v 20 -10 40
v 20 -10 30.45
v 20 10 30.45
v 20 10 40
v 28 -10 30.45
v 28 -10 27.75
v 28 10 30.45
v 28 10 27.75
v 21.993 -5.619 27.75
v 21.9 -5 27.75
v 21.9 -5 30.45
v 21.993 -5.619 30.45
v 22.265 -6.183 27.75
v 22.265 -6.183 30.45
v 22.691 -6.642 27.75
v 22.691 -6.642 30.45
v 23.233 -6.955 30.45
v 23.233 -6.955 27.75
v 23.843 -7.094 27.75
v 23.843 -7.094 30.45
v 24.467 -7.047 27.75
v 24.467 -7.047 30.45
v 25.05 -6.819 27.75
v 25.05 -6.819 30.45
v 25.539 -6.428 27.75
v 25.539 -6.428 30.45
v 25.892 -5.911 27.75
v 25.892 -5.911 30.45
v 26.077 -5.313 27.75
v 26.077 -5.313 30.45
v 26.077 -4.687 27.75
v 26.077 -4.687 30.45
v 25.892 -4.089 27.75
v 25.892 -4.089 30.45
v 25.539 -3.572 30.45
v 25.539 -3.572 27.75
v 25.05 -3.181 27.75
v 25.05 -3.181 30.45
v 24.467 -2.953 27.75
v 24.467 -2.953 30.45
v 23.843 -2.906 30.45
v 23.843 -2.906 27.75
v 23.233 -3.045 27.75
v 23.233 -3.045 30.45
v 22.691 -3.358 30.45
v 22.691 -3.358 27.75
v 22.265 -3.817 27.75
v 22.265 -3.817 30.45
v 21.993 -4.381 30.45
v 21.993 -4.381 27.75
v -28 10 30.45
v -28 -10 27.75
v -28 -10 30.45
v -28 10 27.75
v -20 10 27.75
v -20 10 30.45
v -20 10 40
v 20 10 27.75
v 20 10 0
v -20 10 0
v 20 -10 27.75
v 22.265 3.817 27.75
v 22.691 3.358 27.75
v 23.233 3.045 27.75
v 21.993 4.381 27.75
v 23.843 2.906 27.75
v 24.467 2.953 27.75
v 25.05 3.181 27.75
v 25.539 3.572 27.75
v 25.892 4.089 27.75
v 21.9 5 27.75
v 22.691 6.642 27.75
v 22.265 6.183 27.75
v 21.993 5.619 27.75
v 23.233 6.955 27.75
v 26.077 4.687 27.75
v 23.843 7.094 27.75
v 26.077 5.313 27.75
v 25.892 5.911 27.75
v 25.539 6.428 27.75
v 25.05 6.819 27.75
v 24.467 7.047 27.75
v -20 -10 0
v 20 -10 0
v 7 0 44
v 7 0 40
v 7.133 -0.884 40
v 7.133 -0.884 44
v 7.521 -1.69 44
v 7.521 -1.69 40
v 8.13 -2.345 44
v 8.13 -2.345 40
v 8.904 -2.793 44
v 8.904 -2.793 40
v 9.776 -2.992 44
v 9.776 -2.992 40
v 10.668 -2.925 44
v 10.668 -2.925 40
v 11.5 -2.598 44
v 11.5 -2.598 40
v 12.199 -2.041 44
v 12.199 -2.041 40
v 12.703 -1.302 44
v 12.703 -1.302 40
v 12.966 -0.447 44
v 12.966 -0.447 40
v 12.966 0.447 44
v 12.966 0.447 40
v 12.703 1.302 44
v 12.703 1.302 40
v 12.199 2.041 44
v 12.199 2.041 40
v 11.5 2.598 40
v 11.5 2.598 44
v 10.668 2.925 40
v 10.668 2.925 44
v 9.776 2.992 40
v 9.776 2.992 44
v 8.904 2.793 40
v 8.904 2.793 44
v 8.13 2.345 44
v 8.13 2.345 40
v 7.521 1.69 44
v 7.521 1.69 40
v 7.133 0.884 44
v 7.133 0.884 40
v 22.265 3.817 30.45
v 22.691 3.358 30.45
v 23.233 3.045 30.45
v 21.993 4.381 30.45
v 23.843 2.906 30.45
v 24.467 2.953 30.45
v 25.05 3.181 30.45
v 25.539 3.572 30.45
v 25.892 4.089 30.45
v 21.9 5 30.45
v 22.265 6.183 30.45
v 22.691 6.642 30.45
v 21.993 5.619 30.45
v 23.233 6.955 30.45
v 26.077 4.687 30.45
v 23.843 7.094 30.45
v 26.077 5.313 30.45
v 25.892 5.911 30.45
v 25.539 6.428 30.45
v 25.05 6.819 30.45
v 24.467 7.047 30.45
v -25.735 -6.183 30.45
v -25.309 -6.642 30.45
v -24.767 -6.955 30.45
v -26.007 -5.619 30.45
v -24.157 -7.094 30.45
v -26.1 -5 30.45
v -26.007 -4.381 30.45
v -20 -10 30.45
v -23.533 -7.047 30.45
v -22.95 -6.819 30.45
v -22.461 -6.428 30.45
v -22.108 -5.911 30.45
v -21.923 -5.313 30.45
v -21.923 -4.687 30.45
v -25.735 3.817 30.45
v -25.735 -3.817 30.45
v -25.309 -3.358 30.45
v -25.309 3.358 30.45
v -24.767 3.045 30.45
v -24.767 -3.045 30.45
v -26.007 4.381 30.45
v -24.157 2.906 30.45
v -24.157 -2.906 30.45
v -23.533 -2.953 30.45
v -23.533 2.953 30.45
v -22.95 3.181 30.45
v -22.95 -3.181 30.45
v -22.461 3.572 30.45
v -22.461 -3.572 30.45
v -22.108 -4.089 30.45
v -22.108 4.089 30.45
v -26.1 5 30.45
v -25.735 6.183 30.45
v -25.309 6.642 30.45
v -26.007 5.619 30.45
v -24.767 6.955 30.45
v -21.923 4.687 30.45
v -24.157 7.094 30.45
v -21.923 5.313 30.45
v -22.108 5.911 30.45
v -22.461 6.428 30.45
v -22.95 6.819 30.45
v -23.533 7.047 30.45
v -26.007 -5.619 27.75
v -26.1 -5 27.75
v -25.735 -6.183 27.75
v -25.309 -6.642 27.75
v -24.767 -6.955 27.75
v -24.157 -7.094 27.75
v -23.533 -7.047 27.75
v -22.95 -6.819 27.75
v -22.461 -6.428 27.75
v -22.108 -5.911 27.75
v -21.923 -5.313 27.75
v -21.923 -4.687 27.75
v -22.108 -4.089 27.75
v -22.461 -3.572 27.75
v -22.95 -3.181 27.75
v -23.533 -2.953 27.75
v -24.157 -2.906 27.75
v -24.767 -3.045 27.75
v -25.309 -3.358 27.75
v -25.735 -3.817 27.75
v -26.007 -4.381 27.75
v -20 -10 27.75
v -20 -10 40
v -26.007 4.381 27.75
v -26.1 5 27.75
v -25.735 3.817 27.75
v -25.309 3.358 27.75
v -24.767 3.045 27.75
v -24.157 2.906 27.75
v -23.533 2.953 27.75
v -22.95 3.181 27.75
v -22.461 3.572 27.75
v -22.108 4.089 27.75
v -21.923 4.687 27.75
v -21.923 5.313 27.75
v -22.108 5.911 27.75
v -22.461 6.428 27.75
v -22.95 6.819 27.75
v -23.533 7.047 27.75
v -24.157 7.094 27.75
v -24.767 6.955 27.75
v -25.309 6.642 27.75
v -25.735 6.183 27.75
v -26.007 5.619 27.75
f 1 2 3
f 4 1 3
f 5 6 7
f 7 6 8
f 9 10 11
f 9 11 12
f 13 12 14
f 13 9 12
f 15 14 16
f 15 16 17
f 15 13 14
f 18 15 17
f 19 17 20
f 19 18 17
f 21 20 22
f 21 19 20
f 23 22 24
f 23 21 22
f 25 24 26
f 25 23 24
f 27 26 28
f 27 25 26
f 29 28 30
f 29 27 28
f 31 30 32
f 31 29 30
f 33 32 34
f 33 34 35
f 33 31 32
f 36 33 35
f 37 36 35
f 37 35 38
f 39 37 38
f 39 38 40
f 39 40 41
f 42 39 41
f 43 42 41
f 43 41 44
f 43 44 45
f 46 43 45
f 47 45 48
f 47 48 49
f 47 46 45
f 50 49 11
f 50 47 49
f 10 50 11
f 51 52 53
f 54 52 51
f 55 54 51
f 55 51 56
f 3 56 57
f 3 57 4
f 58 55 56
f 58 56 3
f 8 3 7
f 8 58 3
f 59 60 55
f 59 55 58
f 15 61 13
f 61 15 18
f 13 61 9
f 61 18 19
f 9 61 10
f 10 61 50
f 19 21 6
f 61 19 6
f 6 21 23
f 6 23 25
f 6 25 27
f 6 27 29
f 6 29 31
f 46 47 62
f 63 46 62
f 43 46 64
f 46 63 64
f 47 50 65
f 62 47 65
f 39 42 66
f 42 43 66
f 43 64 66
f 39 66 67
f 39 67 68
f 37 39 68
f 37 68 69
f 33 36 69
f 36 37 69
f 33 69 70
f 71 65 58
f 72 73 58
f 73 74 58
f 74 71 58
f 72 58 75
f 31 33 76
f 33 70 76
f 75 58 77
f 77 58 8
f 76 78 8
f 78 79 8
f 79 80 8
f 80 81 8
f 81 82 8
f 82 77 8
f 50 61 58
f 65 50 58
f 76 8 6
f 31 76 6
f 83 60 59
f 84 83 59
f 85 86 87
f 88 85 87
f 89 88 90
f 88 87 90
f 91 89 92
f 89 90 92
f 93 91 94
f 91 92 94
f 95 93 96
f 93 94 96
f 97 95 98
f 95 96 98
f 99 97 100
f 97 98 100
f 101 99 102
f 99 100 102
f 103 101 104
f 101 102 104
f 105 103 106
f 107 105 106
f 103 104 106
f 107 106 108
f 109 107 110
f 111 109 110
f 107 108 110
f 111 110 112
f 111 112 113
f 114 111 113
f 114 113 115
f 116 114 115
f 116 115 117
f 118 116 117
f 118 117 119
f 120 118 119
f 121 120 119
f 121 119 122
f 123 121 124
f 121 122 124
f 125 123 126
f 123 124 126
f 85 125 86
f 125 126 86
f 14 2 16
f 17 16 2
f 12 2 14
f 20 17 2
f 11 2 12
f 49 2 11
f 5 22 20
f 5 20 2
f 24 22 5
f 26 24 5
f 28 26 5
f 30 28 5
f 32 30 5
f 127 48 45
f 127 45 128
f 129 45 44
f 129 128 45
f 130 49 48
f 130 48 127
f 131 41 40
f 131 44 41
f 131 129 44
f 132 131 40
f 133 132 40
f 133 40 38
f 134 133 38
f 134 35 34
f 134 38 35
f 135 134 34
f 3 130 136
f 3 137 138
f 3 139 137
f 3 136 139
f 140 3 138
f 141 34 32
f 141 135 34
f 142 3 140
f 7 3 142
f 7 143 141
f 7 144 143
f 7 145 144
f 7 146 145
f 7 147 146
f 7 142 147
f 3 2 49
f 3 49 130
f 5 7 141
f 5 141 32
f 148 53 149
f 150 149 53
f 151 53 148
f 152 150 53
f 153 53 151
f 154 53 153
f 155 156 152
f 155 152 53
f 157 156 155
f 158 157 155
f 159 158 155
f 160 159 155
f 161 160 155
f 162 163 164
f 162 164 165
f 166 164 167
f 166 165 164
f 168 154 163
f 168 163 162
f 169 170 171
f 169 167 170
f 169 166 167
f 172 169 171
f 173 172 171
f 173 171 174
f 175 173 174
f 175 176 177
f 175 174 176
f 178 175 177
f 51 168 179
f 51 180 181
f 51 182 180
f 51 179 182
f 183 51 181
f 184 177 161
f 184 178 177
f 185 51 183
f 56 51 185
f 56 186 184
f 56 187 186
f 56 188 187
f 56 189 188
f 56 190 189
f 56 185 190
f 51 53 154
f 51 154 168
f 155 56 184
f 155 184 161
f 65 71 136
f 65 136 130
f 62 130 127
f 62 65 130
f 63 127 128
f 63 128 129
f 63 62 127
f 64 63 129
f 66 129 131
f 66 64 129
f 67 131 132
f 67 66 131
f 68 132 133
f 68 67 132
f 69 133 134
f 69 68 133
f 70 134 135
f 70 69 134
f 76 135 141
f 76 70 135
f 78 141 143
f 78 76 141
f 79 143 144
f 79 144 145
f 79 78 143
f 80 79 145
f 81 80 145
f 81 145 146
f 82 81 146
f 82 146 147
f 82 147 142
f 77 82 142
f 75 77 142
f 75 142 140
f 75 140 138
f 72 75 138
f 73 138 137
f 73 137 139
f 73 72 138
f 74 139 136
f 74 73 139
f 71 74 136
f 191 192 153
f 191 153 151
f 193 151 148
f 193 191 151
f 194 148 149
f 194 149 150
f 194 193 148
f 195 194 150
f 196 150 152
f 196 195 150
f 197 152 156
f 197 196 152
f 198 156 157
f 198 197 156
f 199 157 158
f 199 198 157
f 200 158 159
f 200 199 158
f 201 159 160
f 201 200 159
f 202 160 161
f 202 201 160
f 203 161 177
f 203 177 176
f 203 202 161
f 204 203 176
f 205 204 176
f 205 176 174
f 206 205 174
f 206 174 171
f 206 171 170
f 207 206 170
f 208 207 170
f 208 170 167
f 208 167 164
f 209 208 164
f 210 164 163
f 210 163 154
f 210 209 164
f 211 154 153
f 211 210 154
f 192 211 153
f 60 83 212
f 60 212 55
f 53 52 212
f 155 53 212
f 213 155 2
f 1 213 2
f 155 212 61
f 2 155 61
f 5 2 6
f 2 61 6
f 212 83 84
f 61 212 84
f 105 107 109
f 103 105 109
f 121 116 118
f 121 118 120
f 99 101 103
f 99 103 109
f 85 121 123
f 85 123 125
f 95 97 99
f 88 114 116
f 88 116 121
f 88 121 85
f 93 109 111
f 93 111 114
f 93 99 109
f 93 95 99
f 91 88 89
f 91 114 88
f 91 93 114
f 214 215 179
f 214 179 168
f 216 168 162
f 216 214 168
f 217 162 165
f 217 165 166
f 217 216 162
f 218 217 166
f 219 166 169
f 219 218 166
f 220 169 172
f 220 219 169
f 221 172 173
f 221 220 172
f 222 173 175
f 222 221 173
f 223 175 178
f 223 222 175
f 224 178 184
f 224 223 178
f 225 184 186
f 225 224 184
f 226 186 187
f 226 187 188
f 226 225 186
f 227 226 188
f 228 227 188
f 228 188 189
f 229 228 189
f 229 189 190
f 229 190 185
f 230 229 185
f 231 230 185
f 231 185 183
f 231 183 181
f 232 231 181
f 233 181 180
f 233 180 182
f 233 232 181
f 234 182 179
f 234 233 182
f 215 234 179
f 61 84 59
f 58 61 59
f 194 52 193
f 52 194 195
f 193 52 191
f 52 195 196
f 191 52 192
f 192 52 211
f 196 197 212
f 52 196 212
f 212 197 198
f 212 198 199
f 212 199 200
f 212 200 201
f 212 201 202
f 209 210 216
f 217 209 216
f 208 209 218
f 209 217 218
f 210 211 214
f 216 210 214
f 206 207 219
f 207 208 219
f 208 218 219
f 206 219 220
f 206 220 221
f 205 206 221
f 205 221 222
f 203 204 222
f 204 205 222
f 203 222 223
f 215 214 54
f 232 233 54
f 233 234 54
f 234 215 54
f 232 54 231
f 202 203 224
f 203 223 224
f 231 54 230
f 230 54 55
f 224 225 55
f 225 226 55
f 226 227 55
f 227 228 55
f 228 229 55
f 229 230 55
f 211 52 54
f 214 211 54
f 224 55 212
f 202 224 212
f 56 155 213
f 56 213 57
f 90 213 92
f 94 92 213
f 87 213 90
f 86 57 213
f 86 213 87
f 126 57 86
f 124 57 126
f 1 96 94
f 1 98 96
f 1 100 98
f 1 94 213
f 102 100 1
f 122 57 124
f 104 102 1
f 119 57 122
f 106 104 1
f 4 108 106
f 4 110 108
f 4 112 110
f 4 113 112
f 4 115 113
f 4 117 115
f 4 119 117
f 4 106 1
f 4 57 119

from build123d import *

# Parameters (mm, degrees)
SKETCH1_W           = 40
SKETCH1_H           = 20
BOSS_EXTRUDE1_DEPTH = 40
BOSS_EXTRUDE2_START = 40
SKETCH2_R           = 3
BOSS_EXTRUDE2_DEPTH = 4
BOSS_EXTRUDE3_START = 27.75
SKETCH3_W           = 56
SKETCH3_H           = 20
SKETCH3_R           = 2.1
BOSS_EXTRUDE3_DEPTH = 2.7


with BuildPart() as part:
    # Sketch1 → Boss-Extrude1 (new body)
    with BuildSketch(Plane.XY):
        Rectangle(SKETCH1_W, SKETCH1_H)
    extrude(amount=BOSS_EXTRUDE1_DEPTH)

    # Sketch2 → Boss-Extrude2 (add)
    with BuildSketch(Plane.XY.offset(BOSS_EXTRUDE2_START)):
        with Locations(Location((10, 0, 0), (0, 0, 180))):
            Circle(SKETCH2_R)
    extrude(amount=BOSS_EXTRUDE2_DEPTH)

    # Sketch3 → Boss-Extrude3 (add)
    with BuildSketch(Plane.XY.offset(BOSS_EXTRUDE3_START)):
        Rectangle(SKETCH3_W, SKETCH3_H)
        with Locations(Location((-24, 5, 0), (0, 0, 180))):
            Circle(SKETCH3_R, mode=Mode.SUBTRACT)
        with Locations(Location((-24, -5, 0), (0, 0, 180))):
            Circle(SKETCH3_R, mode=Mode.SUBTRACT)
        with Locations(Location((24, -5, 0), (0, 0, 180))):
            Circle(SKETCH3_R, mode=Mode.SUBTRACT)
        with Locations(Location((24, 5, 0), (0, 0, 180))):
            Circle(SKETCH3_R, mode=Mode.SUBTRACT)
    extrude(amount=BOSS_EXTRUDE3_DEPTH)


solid = part.part
